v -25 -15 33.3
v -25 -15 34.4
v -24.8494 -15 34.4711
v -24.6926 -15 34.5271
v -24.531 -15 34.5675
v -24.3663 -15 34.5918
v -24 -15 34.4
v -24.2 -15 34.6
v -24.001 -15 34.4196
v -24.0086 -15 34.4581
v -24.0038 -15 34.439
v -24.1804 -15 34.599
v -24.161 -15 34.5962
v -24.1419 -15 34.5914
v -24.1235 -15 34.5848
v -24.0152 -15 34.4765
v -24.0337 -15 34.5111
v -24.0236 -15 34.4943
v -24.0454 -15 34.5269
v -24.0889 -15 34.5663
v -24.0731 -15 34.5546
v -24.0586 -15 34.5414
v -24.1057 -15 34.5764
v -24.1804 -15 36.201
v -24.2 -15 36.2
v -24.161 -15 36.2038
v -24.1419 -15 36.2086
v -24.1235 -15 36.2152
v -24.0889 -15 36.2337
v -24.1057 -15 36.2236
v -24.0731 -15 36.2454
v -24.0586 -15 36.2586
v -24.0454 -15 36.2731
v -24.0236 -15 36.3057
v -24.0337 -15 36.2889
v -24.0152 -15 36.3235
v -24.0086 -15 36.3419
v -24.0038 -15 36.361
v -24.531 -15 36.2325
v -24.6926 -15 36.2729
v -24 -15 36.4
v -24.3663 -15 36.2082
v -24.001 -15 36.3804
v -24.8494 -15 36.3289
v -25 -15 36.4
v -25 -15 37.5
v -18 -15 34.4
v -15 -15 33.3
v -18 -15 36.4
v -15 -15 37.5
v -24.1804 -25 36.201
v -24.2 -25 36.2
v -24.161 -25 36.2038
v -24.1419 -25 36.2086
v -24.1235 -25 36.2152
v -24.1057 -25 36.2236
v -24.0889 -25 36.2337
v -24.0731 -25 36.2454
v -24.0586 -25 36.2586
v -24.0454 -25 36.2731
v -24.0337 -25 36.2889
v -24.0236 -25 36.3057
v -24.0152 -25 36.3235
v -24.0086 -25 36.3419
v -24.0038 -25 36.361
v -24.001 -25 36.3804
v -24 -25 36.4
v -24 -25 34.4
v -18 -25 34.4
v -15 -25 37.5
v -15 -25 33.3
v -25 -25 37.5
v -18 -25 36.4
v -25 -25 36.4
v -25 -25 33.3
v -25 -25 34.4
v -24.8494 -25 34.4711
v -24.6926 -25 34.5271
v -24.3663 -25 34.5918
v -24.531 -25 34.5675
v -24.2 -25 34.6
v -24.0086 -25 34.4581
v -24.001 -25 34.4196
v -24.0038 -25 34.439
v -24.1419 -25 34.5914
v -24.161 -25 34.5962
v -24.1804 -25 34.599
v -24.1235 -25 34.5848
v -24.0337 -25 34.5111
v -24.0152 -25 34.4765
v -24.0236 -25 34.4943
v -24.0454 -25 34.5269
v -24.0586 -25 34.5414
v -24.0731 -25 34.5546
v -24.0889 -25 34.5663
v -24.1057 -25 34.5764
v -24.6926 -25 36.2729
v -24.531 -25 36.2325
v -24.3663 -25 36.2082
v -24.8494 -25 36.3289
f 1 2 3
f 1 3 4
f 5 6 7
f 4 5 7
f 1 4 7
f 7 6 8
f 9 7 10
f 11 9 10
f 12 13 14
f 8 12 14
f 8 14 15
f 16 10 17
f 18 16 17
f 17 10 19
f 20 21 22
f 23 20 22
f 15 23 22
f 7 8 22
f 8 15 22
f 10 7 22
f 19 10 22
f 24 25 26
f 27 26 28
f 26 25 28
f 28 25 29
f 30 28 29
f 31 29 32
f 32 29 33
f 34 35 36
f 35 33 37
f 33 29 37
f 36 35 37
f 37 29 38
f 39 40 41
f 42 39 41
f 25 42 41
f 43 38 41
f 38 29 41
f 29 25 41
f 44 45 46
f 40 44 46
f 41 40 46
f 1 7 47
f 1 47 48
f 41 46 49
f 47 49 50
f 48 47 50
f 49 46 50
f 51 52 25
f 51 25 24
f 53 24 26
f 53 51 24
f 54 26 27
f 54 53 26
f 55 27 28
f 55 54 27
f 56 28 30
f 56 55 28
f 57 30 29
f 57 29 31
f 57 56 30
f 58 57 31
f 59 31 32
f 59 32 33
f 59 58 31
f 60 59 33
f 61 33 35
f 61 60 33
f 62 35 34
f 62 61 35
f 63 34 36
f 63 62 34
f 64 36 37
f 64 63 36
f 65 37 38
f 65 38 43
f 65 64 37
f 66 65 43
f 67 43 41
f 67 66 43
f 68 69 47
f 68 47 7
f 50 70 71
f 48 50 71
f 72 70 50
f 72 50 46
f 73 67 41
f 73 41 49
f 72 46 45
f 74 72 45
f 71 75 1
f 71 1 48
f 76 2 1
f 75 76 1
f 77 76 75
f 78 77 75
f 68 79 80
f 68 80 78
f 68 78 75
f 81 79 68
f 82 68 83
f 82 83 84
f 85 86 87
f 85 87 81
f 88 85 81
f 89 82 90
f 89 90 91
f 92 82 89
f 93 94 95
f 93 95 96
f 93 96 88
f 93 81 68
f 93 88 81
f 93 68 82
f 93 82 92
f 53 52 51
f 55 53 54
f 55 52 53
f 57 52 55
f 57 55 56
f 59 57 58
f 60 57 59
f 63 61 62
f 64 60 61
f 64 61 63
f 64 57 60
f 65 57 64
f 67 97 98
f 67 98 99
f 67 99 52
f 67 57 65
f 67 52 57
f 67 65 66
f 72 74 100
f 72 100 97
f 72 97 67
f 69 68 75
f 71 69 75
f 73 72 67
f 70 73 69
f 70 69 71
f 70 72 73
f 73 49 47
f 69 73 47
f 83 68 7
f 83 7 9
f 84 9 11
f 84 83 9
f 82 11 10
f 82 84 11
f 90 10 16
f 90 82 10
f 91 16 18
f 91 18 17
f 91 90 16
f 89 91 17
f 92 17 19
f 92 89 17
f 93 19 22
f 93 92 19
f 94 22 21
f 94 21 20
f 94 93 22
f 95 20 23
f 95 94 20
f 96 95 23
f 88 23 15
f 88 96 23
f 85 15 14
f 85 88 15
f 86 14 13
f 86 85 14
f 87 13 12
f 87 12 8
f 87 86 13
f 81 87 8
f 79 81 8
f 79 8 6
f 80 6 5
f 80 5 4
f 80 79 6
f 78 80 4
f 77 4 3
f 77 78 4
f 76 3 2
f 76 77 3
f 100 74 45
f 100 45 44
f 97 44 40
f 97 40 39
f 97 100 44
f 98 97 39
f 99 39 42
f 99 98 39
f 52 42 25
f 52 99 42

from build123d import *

# Parameters (mm, degrees)
SKETCH1_W               = 30
SKETCH1_H               = 75
MAIN_BLOCK_DEPTH        = 25
FRAME_HOLE_REACH        = 82.467
SKETCH2_R               = 5
EM_ROD_HOLES_REACH      = 56.141
EM_ROD_HOLES_SKETCH_R   = 5
BOSS_EXTRUDE1_DEPTH     = 10
CUT_EXTRUDE1_DEPTH      = 52.53882032
CUT_EXTRUDE1_DEPTH_BACK = 52.53882032
SKETCH5_W               = 30
SKETCH5_H               = 75


with BuildPart() as part:
    # Sketch1 → Main Block (new, symmetric)
    with BuildSketch(Plane(origin=(0, 0, 0), x_dir=(1, 0, 0), z_dir=(0, 1, 0))):
        Rectangle(SKETCH1_W, SKETCH1_H)
    extrude(amount=MAIN_BLOCK_DEPTH, both=True)

    # Sketch2 → Frame Hole (cut, up to next)
    with BuildSketch(Plane.XY.offset(37.5), mode=Mode.PRIVATE) as frame_hole_sk1:
        with Locations((0, -15)):
            Circle(SKETCH2_R)
    frame_hole_tool1 = extrude(frame_hole_sk1.sketch, amount=-FRAME_HOLE_REACH, mode=Mode.PRIVATE) & part.part
    add(frame_hole_tool1.solids().sort_by_distance((0, -15, 37.5))[0], mode=Mode.SUBTRACT)

    # EM Rod Holes Sketch → EM Rod Holes (cut, up to next)
    with BuildSketch(Plane(origin=(15, 0, 0), x_dir=(0, 0, -1), z_dir=(1, 0, 0)), mode=Mode.PRIVATE) as em_rod_holes_sk1:
        with Locations((-15, 15)):
            Circle(EM_ROD_HOLES_SKETCH_R)
    em_rod_holes_tool1 = extrude(em_rod_holes_sk1.sketch, amount=-EM_ROD_HOLES_REACH, mode=Mode.PRIVATE) & part.part
    # EM Rod Holes Sketch → EM Rod Holes (cut, up to next)
    with BuildSketch(Plane(origin=(15, 0, 0), x_dir=(0, 0, -1), z_dir=(1, 0, 0)), mode=Mode.PRIVATE) as em_rod_holes_sk2:
        with Locations((15, 15)):
            Circle(EM_ROD_HOLES_SKETCH_R)
    em_rod_holes_tool2 = extrude(em_rod_holes_sk2.sketch, amount=-EM_ROD_HOLES_REACH, mode=Mode.PRIVATE) & part.part
    add(em_rod_holes_tool1.solids().sort_by_distance((15, 15, 15))[0], mode=Mode.SUBTRACT)
    add(em_rod_holes_tool2.solids().sort_by_distance((15, 15, -15))[0], mode=Mode.SUBTRACT)

    # Sketch4 → Boss-Extrude1 (add)
    with BuildSketch(Plane.XZ.offset(25)):
        Polygon((-15, 33.3), (-15, 37.5), (-25, 37.5), (-25, 36.4), (-24, 36.4), (-18, 36.4), (-18, 34.4), (-24, 34.4), (-25, 34.4), (-25, 33.3), align=None)
        with BuildLine():
            Line((-24, 36.4), (-25, 36.4))
            ThreePointArc((-25, 36.4), (-24.612310563, 36.25075775), (-24.2, 36.2))
            ThreePointArc((-24.2, 36.2), (-24.058578644, 36.258578644), (-24, 36.4))
        make_face()
        with BuildLine():
            ThreePointArc((-24.2, 34.6), (-24.612310563, 34.54924225), (-25, 34.4))
            Line((-25, 34.4), (-24, 34.4))
            ThreePointArc((-24, 34.4), (-24.058578644, 34.541421356), (-24.2, 34.6))
        make_face()
    extrude(amount=-BOSS_EXTRUDE1_DEPTH)

    # Sketch5 → Cut-Extrude1 (cut, two sides: drawn at the far end of the back side and taken through both)
    with BuildSketch(Plane(origin=(0, 0, 0), x_dir=(1, 0, 0), z_dir=(0, 1, 0)).offset(-CUT_EXTRUDE1_DEPTH_BACK)):
        Rectangle(SKETCH5_W, SKETCH5_H)
    extrude(amount=CUT_EXTRUDE1_DEPTH + CUT_EXTRUDE1_DEPTH_BACK, mode=Mode.SUBTRACT)


solid = part.part
